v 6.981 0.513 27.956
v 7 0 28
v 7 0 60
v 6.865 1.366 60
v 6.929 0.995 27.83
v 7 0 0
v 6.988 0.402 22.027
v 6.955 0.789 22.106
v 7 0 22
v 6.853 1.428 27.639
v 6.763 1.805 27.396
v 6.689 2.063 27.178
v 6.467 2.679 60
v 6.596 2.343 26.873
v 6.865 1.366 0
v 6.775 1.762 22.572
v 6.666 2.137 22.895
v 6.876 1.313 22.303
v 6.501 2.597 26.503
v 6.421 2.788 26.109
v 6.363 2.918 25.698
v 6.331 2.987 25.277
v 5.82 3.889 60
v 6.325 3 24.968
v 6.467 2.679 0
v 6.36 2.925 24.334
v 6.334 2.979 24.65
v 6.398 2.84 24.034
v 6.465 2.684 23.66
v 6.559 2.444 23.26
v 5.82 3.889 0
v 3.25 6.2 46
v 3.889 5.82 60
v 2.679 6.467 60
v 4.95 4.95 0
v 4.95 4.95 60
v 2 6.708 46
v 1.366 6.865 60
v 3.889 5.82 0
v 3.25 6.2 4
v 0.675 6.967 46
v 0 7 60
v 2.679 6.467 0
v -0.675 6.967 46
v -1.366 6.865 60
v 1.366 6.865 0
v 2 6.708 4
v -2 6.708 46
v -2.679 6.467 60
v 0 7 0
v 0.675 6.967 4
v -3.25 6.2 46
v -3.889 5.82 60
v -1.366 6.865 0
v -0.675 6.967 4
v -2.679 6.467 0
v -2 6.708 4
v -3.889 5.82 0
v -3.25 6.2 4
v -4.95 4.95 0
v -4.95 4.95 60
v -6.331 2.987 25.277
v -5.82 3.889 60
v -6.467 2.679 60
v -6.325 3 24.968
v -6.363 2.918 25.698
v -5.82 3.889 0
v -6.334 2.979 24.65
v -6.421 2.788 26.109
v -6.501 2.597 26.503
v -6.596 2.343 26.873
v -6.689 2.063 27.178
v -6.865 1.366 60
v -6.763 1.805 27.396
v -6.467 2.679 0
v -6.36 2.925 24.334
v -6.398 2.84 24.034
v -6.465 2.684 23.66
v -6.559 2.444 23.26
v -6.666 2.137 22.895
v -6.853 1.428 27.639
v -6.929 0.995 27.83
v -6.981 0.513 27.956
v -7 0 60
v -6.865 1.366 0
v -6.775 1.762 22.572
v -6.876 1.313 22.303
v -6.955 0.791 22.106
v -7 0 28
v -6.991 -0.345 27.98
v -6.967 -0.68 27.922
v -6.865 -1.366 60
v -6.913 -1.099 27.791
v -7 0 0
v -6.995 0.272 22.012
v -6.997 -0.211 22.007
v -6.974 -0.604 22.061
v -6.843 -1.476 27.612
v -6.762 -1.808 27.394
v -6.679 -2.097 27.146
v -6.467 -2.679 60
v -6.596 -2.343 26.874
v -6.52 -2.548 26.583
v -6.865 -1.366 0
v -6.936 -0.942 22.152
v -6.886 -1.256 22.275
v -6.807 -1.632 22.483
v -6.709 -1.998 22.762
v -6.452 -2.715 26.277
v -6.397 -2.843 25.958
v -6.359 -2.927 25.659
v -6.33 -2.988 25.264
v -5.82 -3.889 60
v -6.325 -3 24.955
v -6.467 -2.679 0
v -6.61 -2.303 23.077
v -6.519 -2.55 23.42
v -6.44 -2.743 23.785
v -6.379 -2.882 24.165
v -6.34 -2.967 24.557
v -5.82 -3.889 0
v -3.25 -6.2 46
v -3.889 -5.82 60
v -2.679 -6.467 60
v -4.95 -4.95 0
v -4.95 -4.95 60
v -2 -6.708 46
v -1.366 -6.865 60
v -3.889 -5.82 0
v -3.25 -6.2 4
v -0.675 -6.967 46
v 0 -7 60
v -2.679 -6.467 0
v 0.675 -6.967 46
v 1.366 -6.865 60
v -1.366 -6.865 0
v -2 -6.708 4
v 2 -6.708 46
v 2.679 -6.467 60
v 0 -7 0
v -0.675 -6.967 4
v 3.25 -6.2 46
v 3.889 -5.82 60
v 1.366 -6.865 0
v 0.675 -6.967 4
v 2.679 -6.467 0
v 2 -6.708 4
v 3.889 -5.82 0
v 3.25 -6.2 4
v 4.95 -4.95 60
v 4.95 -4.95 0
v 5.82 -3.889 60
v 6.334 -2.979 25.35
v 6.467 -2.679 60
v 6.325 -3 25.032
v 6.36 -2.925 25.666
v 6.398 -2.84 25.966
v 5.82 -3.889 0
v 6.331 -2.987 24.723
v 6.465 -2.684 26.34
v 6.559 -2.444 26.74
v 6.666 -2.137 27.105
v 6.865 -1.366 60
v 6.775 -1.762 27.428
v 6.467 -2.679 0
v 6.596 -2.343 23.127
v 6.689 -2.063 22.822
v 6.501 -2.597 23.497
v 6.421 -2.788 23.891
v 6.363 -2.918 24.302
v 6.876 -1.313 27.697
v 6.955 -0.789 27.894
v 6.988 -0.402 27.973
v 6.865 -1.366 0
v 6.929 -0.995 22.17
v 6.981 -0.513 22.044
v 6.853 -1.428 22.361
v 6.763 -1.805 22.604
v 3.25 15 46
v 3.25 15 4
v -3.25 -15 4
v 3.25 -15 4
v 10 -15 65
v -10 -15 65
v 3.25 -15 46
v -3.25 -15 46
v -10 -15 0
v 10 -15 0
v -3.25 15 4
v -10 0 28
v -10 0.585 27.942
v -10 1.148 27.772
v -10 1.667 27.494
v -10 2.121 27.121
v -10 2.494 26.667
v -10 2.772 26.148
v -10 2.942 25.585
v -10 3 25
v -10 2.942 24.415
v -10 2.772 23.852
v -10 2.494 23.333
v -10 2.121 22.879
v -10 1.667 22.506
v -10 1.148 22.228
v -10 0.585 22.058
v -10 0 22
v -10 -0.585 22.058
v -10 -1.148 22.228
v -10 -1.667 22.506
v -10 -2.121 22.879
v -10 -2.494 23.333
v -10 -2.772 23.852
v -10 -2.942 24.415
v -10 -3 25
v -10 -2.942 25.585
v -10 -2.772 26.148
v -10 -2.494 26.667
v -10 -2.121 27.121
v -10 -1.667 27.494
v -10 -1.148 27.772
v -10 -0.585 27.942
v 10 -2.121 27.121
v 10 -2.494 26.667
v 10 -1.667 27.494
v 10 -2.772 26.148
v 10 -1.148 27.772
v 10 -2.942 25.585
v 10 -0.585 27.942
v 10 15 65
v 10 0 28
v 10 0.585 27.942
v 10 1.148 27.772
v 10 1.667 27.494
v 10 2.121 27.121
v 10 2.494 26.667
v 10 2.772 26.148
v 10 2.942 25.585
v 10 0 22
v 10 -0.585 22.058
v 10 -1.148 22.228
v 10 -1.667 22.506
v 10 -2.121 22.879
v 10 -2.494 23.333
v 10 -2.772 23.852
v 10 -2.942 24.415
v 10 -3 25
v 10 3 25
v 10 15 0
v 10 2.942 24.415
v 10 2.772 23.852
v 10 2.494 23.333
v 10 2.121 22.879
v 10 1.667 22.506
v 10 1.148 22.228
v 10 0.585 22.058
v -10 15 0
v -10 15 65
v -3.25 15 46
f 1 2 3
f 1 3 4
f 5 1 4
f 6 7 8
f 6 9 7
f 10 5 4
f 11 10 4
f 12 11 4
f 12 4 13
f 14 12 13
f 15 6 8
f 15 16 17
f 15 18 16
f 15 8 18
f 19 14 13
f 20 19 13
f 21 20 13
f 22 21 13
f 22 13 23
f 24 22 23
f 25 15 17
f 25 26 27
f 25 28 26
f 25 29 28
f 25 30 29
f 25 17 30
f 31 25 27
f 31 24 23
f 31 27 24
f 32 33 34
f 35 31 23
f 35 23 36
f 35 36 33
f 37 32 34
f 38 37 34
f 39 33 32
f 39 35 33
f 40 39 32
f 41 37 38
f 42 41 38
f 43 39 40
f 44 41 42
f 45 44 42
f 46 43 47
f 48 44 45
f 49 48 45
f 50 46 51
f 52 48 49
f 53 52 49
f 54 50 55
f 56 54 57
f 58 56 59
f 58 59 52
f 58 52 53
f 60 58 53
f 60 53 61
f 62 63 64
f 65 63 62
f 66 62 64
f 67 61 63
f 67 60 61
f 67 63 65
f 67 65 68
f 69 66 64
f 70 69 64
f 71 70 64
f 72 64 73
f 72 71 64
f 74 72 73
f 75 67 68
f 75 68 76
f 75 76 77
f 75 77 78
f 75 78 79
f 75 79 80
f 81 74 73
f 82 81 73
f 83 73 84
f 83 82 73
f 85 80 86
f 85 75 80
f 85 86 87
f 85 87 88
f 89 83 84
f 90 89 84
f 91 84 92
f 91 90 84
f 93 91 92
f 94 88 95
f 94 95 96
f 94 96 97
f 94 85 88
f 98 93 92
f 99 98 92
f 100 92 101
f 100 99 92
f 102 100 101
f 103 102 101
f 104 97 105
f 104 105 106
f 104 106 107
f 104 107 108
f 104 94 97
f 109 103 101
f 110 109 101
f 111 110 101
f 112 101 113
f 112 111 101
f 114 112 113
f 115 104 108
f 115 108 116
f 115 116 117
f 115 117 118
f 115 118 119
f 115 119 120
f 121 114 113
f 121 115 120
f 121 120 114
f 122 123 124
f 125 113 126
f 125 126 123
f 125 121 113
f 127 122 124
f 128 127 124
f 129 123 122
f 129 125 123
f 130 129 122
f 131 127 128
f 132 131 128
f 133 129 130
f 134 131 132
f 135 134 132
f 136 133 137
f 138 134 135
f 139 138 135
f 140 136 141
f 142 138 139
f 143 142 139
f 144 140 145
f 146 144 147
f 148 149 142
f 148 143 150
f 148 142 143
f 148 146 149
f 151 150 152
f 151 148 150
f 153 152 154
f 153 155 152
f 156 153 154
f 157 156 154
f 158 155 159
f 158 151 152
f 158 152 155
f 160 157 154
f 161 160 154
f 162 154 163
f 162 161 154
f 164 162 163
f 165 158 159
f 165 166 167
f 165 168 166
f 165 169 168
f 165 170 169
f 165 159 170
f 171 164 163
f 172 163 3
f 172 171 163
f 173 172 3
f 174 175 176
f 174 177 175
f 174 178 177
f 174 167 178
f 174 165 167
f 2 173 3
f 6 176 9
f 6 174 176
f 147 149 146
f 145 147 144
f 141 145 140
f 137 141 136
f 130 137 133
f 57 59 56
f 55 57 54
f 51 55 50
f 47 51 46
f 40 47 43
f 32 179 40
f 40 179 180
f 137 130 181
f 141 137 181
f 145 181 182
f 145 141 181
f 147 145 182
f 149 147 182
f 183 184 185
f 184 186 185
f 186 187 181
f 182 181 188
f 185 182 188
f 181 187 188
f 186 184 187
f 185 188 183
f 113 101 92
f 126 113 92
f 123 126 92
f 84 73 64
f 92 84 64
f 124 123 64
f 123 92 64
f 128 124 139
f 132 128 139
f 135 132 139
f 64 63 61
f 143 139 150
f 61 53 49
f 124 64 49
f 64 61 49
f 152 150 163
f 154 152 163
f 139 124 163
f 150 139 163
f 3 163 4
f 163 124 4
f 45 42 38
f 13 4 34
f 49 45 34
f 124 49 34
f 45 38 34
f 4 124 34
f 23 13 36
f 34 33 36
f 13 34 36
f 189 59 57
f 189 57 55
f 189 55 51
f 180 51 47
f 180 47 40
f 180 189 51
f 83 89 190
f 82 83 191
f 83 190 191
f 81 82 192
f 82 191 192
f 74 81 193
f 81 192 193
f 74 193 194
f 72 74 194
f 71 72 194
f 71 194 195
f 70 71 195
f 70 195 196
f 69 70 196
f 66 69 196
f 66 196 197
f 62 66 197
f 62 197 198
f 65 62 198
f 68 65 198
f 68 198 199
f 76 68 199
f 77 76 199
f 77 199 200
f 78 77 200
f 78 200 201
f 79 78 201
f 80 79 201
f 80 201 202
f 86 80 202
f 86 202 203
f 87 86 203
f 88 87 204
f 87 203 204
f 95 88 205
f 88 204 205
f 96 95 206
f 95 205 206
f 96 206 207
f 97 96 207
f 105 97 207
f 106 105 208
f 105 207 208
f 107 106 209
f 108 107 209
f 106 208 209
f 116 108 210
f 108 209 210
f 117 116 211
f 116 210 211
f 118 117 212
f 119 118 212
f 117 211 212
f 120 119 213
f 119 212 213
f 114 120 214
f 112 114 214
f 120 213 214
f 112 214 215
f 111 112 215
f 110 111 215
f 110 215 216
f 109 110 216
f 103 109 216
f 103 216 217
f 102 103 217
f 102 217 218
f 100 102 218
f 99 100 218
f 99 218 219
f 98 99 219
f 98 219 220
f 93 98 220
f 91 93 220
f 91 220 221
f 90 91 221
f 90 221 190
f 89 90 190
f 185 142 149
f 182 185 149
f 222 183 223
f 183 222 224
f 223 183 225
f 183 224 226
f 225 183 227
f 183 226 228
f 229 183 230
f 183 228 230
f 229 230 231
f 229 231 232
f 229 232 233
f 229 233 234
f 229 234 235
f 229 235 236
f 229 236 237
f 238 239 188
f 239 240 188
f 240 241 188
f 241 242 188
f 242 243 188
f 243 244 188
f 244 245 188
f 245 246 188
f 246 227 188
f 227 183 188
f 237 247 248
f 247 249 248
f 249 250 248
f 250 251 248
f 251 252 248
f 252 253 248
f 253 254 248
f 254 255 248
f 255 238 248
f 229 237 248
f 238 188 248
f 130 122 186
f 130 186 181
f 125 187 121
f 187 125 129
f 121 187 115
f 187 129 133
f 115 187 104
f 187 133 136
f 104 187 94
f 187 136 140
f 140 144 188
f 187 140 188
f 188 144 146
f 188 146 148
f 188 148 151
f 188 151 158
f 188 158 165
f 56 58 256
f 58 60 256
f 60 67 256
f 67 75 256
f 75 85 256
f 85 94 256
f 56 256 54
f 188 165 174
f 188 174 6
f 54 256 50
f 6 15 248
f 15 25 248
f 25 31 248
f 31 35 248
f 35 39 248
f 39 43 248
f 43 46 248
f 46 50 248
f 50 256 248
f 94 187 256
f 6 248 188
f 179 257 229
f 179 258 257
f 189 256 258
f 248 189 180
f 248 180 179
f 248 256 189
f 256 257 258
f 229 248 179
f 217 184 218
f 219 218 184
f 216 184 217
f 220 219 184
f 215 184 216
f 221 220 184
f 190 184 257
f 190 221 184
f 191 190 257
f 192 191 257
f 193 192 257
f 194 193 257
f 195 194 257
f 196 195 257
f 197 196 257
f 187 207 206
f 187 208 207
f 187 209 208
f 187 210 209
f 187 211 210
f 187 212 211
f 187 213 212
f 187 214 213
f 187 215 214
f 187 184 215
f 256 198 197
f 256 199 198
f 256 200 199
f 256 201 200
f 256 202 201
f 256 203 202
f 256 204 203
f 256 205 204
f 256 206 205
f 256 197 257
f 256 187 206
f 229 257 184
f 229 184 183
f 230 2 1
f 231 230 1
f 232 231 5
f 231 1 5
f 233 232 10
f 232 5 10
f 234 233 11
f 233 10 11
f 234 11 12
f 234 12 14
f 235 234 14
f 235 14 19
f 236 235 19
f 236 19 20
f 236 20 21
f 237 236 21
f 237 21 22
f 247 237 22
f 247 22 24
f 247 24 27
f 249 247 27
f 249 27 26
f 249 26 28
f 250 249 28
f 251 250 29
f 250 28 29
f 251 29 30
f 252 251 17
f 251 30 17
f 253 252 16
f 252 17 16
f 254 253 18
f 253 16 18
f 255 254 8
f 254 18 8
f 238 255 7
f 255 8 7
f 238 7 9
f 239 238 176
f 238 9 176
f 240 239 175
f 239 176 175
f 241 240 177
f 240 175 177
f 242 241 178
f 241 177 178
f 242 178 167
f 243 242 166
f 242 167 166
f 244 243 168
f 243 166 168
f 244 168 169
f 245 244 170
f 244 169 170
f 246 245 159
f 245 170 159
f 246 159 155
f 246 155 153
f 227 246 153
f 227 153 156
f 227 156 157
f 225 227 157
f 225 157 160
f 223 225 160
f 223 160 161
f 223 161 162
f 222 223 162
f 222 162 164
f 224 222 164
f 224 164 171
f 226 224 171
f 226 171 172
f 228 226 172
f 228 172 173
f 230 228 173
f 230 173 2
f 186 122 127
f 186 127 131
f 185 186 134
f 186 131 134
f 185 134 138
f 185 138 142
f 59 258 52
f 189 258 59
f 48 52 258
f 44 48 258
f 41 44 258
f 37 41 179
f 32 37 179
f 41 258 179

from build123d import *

# Parameters (mm, degrees)
SKETCH1_W           = 20
SKETCH1_H           = 30
BOSS_EXTRUDE1_DEPTH = 65
SKETCH3_R           = 7
CUT_EXTRUDE1_DEPTH  = 60
SKETCH4_R           = 3
CUT_EXTRUDE2_DEPTH  = 21
SKETCH5_W           = 6.5
SKETCH5_H           = 42
CUT_EXTRUDE3_DEPTH  = 31


with BuildPart() as part:
    # Sketch1 → Boss-Extrude1 (new body)
    with BuildSketch(Plane.XY):
        Rectangle(SKETCH1_W, SKETCH1_H)
    extrude(amount=BOSS_EXTRUDE1_DEPTH)

    # Sketch3 → Cut-Extrude1 (cut)
    with BuildSketch(Plane.XY):
        Circle(SKETCH3_R)
    extrude(amount=CUT_EXTRUDE1_DEPTH, mode=Mode.SUBTRACT)

    # Sketch4 → Cut-Extrude2 (cut, through all)
    with BuildSketch(Plane.ZY.offset(10)):
        with Locations((25, 0)):
            Circle(SKETCH4_R)
    extrude(amount=-CUT_EXTRUDE2_DEPTH, mode=Mode.SUBTRACT)

    # Sketch5 → Cut-Extrude3 (cut, through all)
    with BuildSketch(Plane(origin=(0, 15, 0), x_dir=(1, 0, 0), z_dir=(0, 1, 0))):
        with Locations((0, -25)):
            Rectangle(SKETCH5_W, SKETCH5_H)
    extrude(amount=-CUT_EXTRUDE3_DEPTH, mode=Mode.SUBTRACT)


solid = part.part
